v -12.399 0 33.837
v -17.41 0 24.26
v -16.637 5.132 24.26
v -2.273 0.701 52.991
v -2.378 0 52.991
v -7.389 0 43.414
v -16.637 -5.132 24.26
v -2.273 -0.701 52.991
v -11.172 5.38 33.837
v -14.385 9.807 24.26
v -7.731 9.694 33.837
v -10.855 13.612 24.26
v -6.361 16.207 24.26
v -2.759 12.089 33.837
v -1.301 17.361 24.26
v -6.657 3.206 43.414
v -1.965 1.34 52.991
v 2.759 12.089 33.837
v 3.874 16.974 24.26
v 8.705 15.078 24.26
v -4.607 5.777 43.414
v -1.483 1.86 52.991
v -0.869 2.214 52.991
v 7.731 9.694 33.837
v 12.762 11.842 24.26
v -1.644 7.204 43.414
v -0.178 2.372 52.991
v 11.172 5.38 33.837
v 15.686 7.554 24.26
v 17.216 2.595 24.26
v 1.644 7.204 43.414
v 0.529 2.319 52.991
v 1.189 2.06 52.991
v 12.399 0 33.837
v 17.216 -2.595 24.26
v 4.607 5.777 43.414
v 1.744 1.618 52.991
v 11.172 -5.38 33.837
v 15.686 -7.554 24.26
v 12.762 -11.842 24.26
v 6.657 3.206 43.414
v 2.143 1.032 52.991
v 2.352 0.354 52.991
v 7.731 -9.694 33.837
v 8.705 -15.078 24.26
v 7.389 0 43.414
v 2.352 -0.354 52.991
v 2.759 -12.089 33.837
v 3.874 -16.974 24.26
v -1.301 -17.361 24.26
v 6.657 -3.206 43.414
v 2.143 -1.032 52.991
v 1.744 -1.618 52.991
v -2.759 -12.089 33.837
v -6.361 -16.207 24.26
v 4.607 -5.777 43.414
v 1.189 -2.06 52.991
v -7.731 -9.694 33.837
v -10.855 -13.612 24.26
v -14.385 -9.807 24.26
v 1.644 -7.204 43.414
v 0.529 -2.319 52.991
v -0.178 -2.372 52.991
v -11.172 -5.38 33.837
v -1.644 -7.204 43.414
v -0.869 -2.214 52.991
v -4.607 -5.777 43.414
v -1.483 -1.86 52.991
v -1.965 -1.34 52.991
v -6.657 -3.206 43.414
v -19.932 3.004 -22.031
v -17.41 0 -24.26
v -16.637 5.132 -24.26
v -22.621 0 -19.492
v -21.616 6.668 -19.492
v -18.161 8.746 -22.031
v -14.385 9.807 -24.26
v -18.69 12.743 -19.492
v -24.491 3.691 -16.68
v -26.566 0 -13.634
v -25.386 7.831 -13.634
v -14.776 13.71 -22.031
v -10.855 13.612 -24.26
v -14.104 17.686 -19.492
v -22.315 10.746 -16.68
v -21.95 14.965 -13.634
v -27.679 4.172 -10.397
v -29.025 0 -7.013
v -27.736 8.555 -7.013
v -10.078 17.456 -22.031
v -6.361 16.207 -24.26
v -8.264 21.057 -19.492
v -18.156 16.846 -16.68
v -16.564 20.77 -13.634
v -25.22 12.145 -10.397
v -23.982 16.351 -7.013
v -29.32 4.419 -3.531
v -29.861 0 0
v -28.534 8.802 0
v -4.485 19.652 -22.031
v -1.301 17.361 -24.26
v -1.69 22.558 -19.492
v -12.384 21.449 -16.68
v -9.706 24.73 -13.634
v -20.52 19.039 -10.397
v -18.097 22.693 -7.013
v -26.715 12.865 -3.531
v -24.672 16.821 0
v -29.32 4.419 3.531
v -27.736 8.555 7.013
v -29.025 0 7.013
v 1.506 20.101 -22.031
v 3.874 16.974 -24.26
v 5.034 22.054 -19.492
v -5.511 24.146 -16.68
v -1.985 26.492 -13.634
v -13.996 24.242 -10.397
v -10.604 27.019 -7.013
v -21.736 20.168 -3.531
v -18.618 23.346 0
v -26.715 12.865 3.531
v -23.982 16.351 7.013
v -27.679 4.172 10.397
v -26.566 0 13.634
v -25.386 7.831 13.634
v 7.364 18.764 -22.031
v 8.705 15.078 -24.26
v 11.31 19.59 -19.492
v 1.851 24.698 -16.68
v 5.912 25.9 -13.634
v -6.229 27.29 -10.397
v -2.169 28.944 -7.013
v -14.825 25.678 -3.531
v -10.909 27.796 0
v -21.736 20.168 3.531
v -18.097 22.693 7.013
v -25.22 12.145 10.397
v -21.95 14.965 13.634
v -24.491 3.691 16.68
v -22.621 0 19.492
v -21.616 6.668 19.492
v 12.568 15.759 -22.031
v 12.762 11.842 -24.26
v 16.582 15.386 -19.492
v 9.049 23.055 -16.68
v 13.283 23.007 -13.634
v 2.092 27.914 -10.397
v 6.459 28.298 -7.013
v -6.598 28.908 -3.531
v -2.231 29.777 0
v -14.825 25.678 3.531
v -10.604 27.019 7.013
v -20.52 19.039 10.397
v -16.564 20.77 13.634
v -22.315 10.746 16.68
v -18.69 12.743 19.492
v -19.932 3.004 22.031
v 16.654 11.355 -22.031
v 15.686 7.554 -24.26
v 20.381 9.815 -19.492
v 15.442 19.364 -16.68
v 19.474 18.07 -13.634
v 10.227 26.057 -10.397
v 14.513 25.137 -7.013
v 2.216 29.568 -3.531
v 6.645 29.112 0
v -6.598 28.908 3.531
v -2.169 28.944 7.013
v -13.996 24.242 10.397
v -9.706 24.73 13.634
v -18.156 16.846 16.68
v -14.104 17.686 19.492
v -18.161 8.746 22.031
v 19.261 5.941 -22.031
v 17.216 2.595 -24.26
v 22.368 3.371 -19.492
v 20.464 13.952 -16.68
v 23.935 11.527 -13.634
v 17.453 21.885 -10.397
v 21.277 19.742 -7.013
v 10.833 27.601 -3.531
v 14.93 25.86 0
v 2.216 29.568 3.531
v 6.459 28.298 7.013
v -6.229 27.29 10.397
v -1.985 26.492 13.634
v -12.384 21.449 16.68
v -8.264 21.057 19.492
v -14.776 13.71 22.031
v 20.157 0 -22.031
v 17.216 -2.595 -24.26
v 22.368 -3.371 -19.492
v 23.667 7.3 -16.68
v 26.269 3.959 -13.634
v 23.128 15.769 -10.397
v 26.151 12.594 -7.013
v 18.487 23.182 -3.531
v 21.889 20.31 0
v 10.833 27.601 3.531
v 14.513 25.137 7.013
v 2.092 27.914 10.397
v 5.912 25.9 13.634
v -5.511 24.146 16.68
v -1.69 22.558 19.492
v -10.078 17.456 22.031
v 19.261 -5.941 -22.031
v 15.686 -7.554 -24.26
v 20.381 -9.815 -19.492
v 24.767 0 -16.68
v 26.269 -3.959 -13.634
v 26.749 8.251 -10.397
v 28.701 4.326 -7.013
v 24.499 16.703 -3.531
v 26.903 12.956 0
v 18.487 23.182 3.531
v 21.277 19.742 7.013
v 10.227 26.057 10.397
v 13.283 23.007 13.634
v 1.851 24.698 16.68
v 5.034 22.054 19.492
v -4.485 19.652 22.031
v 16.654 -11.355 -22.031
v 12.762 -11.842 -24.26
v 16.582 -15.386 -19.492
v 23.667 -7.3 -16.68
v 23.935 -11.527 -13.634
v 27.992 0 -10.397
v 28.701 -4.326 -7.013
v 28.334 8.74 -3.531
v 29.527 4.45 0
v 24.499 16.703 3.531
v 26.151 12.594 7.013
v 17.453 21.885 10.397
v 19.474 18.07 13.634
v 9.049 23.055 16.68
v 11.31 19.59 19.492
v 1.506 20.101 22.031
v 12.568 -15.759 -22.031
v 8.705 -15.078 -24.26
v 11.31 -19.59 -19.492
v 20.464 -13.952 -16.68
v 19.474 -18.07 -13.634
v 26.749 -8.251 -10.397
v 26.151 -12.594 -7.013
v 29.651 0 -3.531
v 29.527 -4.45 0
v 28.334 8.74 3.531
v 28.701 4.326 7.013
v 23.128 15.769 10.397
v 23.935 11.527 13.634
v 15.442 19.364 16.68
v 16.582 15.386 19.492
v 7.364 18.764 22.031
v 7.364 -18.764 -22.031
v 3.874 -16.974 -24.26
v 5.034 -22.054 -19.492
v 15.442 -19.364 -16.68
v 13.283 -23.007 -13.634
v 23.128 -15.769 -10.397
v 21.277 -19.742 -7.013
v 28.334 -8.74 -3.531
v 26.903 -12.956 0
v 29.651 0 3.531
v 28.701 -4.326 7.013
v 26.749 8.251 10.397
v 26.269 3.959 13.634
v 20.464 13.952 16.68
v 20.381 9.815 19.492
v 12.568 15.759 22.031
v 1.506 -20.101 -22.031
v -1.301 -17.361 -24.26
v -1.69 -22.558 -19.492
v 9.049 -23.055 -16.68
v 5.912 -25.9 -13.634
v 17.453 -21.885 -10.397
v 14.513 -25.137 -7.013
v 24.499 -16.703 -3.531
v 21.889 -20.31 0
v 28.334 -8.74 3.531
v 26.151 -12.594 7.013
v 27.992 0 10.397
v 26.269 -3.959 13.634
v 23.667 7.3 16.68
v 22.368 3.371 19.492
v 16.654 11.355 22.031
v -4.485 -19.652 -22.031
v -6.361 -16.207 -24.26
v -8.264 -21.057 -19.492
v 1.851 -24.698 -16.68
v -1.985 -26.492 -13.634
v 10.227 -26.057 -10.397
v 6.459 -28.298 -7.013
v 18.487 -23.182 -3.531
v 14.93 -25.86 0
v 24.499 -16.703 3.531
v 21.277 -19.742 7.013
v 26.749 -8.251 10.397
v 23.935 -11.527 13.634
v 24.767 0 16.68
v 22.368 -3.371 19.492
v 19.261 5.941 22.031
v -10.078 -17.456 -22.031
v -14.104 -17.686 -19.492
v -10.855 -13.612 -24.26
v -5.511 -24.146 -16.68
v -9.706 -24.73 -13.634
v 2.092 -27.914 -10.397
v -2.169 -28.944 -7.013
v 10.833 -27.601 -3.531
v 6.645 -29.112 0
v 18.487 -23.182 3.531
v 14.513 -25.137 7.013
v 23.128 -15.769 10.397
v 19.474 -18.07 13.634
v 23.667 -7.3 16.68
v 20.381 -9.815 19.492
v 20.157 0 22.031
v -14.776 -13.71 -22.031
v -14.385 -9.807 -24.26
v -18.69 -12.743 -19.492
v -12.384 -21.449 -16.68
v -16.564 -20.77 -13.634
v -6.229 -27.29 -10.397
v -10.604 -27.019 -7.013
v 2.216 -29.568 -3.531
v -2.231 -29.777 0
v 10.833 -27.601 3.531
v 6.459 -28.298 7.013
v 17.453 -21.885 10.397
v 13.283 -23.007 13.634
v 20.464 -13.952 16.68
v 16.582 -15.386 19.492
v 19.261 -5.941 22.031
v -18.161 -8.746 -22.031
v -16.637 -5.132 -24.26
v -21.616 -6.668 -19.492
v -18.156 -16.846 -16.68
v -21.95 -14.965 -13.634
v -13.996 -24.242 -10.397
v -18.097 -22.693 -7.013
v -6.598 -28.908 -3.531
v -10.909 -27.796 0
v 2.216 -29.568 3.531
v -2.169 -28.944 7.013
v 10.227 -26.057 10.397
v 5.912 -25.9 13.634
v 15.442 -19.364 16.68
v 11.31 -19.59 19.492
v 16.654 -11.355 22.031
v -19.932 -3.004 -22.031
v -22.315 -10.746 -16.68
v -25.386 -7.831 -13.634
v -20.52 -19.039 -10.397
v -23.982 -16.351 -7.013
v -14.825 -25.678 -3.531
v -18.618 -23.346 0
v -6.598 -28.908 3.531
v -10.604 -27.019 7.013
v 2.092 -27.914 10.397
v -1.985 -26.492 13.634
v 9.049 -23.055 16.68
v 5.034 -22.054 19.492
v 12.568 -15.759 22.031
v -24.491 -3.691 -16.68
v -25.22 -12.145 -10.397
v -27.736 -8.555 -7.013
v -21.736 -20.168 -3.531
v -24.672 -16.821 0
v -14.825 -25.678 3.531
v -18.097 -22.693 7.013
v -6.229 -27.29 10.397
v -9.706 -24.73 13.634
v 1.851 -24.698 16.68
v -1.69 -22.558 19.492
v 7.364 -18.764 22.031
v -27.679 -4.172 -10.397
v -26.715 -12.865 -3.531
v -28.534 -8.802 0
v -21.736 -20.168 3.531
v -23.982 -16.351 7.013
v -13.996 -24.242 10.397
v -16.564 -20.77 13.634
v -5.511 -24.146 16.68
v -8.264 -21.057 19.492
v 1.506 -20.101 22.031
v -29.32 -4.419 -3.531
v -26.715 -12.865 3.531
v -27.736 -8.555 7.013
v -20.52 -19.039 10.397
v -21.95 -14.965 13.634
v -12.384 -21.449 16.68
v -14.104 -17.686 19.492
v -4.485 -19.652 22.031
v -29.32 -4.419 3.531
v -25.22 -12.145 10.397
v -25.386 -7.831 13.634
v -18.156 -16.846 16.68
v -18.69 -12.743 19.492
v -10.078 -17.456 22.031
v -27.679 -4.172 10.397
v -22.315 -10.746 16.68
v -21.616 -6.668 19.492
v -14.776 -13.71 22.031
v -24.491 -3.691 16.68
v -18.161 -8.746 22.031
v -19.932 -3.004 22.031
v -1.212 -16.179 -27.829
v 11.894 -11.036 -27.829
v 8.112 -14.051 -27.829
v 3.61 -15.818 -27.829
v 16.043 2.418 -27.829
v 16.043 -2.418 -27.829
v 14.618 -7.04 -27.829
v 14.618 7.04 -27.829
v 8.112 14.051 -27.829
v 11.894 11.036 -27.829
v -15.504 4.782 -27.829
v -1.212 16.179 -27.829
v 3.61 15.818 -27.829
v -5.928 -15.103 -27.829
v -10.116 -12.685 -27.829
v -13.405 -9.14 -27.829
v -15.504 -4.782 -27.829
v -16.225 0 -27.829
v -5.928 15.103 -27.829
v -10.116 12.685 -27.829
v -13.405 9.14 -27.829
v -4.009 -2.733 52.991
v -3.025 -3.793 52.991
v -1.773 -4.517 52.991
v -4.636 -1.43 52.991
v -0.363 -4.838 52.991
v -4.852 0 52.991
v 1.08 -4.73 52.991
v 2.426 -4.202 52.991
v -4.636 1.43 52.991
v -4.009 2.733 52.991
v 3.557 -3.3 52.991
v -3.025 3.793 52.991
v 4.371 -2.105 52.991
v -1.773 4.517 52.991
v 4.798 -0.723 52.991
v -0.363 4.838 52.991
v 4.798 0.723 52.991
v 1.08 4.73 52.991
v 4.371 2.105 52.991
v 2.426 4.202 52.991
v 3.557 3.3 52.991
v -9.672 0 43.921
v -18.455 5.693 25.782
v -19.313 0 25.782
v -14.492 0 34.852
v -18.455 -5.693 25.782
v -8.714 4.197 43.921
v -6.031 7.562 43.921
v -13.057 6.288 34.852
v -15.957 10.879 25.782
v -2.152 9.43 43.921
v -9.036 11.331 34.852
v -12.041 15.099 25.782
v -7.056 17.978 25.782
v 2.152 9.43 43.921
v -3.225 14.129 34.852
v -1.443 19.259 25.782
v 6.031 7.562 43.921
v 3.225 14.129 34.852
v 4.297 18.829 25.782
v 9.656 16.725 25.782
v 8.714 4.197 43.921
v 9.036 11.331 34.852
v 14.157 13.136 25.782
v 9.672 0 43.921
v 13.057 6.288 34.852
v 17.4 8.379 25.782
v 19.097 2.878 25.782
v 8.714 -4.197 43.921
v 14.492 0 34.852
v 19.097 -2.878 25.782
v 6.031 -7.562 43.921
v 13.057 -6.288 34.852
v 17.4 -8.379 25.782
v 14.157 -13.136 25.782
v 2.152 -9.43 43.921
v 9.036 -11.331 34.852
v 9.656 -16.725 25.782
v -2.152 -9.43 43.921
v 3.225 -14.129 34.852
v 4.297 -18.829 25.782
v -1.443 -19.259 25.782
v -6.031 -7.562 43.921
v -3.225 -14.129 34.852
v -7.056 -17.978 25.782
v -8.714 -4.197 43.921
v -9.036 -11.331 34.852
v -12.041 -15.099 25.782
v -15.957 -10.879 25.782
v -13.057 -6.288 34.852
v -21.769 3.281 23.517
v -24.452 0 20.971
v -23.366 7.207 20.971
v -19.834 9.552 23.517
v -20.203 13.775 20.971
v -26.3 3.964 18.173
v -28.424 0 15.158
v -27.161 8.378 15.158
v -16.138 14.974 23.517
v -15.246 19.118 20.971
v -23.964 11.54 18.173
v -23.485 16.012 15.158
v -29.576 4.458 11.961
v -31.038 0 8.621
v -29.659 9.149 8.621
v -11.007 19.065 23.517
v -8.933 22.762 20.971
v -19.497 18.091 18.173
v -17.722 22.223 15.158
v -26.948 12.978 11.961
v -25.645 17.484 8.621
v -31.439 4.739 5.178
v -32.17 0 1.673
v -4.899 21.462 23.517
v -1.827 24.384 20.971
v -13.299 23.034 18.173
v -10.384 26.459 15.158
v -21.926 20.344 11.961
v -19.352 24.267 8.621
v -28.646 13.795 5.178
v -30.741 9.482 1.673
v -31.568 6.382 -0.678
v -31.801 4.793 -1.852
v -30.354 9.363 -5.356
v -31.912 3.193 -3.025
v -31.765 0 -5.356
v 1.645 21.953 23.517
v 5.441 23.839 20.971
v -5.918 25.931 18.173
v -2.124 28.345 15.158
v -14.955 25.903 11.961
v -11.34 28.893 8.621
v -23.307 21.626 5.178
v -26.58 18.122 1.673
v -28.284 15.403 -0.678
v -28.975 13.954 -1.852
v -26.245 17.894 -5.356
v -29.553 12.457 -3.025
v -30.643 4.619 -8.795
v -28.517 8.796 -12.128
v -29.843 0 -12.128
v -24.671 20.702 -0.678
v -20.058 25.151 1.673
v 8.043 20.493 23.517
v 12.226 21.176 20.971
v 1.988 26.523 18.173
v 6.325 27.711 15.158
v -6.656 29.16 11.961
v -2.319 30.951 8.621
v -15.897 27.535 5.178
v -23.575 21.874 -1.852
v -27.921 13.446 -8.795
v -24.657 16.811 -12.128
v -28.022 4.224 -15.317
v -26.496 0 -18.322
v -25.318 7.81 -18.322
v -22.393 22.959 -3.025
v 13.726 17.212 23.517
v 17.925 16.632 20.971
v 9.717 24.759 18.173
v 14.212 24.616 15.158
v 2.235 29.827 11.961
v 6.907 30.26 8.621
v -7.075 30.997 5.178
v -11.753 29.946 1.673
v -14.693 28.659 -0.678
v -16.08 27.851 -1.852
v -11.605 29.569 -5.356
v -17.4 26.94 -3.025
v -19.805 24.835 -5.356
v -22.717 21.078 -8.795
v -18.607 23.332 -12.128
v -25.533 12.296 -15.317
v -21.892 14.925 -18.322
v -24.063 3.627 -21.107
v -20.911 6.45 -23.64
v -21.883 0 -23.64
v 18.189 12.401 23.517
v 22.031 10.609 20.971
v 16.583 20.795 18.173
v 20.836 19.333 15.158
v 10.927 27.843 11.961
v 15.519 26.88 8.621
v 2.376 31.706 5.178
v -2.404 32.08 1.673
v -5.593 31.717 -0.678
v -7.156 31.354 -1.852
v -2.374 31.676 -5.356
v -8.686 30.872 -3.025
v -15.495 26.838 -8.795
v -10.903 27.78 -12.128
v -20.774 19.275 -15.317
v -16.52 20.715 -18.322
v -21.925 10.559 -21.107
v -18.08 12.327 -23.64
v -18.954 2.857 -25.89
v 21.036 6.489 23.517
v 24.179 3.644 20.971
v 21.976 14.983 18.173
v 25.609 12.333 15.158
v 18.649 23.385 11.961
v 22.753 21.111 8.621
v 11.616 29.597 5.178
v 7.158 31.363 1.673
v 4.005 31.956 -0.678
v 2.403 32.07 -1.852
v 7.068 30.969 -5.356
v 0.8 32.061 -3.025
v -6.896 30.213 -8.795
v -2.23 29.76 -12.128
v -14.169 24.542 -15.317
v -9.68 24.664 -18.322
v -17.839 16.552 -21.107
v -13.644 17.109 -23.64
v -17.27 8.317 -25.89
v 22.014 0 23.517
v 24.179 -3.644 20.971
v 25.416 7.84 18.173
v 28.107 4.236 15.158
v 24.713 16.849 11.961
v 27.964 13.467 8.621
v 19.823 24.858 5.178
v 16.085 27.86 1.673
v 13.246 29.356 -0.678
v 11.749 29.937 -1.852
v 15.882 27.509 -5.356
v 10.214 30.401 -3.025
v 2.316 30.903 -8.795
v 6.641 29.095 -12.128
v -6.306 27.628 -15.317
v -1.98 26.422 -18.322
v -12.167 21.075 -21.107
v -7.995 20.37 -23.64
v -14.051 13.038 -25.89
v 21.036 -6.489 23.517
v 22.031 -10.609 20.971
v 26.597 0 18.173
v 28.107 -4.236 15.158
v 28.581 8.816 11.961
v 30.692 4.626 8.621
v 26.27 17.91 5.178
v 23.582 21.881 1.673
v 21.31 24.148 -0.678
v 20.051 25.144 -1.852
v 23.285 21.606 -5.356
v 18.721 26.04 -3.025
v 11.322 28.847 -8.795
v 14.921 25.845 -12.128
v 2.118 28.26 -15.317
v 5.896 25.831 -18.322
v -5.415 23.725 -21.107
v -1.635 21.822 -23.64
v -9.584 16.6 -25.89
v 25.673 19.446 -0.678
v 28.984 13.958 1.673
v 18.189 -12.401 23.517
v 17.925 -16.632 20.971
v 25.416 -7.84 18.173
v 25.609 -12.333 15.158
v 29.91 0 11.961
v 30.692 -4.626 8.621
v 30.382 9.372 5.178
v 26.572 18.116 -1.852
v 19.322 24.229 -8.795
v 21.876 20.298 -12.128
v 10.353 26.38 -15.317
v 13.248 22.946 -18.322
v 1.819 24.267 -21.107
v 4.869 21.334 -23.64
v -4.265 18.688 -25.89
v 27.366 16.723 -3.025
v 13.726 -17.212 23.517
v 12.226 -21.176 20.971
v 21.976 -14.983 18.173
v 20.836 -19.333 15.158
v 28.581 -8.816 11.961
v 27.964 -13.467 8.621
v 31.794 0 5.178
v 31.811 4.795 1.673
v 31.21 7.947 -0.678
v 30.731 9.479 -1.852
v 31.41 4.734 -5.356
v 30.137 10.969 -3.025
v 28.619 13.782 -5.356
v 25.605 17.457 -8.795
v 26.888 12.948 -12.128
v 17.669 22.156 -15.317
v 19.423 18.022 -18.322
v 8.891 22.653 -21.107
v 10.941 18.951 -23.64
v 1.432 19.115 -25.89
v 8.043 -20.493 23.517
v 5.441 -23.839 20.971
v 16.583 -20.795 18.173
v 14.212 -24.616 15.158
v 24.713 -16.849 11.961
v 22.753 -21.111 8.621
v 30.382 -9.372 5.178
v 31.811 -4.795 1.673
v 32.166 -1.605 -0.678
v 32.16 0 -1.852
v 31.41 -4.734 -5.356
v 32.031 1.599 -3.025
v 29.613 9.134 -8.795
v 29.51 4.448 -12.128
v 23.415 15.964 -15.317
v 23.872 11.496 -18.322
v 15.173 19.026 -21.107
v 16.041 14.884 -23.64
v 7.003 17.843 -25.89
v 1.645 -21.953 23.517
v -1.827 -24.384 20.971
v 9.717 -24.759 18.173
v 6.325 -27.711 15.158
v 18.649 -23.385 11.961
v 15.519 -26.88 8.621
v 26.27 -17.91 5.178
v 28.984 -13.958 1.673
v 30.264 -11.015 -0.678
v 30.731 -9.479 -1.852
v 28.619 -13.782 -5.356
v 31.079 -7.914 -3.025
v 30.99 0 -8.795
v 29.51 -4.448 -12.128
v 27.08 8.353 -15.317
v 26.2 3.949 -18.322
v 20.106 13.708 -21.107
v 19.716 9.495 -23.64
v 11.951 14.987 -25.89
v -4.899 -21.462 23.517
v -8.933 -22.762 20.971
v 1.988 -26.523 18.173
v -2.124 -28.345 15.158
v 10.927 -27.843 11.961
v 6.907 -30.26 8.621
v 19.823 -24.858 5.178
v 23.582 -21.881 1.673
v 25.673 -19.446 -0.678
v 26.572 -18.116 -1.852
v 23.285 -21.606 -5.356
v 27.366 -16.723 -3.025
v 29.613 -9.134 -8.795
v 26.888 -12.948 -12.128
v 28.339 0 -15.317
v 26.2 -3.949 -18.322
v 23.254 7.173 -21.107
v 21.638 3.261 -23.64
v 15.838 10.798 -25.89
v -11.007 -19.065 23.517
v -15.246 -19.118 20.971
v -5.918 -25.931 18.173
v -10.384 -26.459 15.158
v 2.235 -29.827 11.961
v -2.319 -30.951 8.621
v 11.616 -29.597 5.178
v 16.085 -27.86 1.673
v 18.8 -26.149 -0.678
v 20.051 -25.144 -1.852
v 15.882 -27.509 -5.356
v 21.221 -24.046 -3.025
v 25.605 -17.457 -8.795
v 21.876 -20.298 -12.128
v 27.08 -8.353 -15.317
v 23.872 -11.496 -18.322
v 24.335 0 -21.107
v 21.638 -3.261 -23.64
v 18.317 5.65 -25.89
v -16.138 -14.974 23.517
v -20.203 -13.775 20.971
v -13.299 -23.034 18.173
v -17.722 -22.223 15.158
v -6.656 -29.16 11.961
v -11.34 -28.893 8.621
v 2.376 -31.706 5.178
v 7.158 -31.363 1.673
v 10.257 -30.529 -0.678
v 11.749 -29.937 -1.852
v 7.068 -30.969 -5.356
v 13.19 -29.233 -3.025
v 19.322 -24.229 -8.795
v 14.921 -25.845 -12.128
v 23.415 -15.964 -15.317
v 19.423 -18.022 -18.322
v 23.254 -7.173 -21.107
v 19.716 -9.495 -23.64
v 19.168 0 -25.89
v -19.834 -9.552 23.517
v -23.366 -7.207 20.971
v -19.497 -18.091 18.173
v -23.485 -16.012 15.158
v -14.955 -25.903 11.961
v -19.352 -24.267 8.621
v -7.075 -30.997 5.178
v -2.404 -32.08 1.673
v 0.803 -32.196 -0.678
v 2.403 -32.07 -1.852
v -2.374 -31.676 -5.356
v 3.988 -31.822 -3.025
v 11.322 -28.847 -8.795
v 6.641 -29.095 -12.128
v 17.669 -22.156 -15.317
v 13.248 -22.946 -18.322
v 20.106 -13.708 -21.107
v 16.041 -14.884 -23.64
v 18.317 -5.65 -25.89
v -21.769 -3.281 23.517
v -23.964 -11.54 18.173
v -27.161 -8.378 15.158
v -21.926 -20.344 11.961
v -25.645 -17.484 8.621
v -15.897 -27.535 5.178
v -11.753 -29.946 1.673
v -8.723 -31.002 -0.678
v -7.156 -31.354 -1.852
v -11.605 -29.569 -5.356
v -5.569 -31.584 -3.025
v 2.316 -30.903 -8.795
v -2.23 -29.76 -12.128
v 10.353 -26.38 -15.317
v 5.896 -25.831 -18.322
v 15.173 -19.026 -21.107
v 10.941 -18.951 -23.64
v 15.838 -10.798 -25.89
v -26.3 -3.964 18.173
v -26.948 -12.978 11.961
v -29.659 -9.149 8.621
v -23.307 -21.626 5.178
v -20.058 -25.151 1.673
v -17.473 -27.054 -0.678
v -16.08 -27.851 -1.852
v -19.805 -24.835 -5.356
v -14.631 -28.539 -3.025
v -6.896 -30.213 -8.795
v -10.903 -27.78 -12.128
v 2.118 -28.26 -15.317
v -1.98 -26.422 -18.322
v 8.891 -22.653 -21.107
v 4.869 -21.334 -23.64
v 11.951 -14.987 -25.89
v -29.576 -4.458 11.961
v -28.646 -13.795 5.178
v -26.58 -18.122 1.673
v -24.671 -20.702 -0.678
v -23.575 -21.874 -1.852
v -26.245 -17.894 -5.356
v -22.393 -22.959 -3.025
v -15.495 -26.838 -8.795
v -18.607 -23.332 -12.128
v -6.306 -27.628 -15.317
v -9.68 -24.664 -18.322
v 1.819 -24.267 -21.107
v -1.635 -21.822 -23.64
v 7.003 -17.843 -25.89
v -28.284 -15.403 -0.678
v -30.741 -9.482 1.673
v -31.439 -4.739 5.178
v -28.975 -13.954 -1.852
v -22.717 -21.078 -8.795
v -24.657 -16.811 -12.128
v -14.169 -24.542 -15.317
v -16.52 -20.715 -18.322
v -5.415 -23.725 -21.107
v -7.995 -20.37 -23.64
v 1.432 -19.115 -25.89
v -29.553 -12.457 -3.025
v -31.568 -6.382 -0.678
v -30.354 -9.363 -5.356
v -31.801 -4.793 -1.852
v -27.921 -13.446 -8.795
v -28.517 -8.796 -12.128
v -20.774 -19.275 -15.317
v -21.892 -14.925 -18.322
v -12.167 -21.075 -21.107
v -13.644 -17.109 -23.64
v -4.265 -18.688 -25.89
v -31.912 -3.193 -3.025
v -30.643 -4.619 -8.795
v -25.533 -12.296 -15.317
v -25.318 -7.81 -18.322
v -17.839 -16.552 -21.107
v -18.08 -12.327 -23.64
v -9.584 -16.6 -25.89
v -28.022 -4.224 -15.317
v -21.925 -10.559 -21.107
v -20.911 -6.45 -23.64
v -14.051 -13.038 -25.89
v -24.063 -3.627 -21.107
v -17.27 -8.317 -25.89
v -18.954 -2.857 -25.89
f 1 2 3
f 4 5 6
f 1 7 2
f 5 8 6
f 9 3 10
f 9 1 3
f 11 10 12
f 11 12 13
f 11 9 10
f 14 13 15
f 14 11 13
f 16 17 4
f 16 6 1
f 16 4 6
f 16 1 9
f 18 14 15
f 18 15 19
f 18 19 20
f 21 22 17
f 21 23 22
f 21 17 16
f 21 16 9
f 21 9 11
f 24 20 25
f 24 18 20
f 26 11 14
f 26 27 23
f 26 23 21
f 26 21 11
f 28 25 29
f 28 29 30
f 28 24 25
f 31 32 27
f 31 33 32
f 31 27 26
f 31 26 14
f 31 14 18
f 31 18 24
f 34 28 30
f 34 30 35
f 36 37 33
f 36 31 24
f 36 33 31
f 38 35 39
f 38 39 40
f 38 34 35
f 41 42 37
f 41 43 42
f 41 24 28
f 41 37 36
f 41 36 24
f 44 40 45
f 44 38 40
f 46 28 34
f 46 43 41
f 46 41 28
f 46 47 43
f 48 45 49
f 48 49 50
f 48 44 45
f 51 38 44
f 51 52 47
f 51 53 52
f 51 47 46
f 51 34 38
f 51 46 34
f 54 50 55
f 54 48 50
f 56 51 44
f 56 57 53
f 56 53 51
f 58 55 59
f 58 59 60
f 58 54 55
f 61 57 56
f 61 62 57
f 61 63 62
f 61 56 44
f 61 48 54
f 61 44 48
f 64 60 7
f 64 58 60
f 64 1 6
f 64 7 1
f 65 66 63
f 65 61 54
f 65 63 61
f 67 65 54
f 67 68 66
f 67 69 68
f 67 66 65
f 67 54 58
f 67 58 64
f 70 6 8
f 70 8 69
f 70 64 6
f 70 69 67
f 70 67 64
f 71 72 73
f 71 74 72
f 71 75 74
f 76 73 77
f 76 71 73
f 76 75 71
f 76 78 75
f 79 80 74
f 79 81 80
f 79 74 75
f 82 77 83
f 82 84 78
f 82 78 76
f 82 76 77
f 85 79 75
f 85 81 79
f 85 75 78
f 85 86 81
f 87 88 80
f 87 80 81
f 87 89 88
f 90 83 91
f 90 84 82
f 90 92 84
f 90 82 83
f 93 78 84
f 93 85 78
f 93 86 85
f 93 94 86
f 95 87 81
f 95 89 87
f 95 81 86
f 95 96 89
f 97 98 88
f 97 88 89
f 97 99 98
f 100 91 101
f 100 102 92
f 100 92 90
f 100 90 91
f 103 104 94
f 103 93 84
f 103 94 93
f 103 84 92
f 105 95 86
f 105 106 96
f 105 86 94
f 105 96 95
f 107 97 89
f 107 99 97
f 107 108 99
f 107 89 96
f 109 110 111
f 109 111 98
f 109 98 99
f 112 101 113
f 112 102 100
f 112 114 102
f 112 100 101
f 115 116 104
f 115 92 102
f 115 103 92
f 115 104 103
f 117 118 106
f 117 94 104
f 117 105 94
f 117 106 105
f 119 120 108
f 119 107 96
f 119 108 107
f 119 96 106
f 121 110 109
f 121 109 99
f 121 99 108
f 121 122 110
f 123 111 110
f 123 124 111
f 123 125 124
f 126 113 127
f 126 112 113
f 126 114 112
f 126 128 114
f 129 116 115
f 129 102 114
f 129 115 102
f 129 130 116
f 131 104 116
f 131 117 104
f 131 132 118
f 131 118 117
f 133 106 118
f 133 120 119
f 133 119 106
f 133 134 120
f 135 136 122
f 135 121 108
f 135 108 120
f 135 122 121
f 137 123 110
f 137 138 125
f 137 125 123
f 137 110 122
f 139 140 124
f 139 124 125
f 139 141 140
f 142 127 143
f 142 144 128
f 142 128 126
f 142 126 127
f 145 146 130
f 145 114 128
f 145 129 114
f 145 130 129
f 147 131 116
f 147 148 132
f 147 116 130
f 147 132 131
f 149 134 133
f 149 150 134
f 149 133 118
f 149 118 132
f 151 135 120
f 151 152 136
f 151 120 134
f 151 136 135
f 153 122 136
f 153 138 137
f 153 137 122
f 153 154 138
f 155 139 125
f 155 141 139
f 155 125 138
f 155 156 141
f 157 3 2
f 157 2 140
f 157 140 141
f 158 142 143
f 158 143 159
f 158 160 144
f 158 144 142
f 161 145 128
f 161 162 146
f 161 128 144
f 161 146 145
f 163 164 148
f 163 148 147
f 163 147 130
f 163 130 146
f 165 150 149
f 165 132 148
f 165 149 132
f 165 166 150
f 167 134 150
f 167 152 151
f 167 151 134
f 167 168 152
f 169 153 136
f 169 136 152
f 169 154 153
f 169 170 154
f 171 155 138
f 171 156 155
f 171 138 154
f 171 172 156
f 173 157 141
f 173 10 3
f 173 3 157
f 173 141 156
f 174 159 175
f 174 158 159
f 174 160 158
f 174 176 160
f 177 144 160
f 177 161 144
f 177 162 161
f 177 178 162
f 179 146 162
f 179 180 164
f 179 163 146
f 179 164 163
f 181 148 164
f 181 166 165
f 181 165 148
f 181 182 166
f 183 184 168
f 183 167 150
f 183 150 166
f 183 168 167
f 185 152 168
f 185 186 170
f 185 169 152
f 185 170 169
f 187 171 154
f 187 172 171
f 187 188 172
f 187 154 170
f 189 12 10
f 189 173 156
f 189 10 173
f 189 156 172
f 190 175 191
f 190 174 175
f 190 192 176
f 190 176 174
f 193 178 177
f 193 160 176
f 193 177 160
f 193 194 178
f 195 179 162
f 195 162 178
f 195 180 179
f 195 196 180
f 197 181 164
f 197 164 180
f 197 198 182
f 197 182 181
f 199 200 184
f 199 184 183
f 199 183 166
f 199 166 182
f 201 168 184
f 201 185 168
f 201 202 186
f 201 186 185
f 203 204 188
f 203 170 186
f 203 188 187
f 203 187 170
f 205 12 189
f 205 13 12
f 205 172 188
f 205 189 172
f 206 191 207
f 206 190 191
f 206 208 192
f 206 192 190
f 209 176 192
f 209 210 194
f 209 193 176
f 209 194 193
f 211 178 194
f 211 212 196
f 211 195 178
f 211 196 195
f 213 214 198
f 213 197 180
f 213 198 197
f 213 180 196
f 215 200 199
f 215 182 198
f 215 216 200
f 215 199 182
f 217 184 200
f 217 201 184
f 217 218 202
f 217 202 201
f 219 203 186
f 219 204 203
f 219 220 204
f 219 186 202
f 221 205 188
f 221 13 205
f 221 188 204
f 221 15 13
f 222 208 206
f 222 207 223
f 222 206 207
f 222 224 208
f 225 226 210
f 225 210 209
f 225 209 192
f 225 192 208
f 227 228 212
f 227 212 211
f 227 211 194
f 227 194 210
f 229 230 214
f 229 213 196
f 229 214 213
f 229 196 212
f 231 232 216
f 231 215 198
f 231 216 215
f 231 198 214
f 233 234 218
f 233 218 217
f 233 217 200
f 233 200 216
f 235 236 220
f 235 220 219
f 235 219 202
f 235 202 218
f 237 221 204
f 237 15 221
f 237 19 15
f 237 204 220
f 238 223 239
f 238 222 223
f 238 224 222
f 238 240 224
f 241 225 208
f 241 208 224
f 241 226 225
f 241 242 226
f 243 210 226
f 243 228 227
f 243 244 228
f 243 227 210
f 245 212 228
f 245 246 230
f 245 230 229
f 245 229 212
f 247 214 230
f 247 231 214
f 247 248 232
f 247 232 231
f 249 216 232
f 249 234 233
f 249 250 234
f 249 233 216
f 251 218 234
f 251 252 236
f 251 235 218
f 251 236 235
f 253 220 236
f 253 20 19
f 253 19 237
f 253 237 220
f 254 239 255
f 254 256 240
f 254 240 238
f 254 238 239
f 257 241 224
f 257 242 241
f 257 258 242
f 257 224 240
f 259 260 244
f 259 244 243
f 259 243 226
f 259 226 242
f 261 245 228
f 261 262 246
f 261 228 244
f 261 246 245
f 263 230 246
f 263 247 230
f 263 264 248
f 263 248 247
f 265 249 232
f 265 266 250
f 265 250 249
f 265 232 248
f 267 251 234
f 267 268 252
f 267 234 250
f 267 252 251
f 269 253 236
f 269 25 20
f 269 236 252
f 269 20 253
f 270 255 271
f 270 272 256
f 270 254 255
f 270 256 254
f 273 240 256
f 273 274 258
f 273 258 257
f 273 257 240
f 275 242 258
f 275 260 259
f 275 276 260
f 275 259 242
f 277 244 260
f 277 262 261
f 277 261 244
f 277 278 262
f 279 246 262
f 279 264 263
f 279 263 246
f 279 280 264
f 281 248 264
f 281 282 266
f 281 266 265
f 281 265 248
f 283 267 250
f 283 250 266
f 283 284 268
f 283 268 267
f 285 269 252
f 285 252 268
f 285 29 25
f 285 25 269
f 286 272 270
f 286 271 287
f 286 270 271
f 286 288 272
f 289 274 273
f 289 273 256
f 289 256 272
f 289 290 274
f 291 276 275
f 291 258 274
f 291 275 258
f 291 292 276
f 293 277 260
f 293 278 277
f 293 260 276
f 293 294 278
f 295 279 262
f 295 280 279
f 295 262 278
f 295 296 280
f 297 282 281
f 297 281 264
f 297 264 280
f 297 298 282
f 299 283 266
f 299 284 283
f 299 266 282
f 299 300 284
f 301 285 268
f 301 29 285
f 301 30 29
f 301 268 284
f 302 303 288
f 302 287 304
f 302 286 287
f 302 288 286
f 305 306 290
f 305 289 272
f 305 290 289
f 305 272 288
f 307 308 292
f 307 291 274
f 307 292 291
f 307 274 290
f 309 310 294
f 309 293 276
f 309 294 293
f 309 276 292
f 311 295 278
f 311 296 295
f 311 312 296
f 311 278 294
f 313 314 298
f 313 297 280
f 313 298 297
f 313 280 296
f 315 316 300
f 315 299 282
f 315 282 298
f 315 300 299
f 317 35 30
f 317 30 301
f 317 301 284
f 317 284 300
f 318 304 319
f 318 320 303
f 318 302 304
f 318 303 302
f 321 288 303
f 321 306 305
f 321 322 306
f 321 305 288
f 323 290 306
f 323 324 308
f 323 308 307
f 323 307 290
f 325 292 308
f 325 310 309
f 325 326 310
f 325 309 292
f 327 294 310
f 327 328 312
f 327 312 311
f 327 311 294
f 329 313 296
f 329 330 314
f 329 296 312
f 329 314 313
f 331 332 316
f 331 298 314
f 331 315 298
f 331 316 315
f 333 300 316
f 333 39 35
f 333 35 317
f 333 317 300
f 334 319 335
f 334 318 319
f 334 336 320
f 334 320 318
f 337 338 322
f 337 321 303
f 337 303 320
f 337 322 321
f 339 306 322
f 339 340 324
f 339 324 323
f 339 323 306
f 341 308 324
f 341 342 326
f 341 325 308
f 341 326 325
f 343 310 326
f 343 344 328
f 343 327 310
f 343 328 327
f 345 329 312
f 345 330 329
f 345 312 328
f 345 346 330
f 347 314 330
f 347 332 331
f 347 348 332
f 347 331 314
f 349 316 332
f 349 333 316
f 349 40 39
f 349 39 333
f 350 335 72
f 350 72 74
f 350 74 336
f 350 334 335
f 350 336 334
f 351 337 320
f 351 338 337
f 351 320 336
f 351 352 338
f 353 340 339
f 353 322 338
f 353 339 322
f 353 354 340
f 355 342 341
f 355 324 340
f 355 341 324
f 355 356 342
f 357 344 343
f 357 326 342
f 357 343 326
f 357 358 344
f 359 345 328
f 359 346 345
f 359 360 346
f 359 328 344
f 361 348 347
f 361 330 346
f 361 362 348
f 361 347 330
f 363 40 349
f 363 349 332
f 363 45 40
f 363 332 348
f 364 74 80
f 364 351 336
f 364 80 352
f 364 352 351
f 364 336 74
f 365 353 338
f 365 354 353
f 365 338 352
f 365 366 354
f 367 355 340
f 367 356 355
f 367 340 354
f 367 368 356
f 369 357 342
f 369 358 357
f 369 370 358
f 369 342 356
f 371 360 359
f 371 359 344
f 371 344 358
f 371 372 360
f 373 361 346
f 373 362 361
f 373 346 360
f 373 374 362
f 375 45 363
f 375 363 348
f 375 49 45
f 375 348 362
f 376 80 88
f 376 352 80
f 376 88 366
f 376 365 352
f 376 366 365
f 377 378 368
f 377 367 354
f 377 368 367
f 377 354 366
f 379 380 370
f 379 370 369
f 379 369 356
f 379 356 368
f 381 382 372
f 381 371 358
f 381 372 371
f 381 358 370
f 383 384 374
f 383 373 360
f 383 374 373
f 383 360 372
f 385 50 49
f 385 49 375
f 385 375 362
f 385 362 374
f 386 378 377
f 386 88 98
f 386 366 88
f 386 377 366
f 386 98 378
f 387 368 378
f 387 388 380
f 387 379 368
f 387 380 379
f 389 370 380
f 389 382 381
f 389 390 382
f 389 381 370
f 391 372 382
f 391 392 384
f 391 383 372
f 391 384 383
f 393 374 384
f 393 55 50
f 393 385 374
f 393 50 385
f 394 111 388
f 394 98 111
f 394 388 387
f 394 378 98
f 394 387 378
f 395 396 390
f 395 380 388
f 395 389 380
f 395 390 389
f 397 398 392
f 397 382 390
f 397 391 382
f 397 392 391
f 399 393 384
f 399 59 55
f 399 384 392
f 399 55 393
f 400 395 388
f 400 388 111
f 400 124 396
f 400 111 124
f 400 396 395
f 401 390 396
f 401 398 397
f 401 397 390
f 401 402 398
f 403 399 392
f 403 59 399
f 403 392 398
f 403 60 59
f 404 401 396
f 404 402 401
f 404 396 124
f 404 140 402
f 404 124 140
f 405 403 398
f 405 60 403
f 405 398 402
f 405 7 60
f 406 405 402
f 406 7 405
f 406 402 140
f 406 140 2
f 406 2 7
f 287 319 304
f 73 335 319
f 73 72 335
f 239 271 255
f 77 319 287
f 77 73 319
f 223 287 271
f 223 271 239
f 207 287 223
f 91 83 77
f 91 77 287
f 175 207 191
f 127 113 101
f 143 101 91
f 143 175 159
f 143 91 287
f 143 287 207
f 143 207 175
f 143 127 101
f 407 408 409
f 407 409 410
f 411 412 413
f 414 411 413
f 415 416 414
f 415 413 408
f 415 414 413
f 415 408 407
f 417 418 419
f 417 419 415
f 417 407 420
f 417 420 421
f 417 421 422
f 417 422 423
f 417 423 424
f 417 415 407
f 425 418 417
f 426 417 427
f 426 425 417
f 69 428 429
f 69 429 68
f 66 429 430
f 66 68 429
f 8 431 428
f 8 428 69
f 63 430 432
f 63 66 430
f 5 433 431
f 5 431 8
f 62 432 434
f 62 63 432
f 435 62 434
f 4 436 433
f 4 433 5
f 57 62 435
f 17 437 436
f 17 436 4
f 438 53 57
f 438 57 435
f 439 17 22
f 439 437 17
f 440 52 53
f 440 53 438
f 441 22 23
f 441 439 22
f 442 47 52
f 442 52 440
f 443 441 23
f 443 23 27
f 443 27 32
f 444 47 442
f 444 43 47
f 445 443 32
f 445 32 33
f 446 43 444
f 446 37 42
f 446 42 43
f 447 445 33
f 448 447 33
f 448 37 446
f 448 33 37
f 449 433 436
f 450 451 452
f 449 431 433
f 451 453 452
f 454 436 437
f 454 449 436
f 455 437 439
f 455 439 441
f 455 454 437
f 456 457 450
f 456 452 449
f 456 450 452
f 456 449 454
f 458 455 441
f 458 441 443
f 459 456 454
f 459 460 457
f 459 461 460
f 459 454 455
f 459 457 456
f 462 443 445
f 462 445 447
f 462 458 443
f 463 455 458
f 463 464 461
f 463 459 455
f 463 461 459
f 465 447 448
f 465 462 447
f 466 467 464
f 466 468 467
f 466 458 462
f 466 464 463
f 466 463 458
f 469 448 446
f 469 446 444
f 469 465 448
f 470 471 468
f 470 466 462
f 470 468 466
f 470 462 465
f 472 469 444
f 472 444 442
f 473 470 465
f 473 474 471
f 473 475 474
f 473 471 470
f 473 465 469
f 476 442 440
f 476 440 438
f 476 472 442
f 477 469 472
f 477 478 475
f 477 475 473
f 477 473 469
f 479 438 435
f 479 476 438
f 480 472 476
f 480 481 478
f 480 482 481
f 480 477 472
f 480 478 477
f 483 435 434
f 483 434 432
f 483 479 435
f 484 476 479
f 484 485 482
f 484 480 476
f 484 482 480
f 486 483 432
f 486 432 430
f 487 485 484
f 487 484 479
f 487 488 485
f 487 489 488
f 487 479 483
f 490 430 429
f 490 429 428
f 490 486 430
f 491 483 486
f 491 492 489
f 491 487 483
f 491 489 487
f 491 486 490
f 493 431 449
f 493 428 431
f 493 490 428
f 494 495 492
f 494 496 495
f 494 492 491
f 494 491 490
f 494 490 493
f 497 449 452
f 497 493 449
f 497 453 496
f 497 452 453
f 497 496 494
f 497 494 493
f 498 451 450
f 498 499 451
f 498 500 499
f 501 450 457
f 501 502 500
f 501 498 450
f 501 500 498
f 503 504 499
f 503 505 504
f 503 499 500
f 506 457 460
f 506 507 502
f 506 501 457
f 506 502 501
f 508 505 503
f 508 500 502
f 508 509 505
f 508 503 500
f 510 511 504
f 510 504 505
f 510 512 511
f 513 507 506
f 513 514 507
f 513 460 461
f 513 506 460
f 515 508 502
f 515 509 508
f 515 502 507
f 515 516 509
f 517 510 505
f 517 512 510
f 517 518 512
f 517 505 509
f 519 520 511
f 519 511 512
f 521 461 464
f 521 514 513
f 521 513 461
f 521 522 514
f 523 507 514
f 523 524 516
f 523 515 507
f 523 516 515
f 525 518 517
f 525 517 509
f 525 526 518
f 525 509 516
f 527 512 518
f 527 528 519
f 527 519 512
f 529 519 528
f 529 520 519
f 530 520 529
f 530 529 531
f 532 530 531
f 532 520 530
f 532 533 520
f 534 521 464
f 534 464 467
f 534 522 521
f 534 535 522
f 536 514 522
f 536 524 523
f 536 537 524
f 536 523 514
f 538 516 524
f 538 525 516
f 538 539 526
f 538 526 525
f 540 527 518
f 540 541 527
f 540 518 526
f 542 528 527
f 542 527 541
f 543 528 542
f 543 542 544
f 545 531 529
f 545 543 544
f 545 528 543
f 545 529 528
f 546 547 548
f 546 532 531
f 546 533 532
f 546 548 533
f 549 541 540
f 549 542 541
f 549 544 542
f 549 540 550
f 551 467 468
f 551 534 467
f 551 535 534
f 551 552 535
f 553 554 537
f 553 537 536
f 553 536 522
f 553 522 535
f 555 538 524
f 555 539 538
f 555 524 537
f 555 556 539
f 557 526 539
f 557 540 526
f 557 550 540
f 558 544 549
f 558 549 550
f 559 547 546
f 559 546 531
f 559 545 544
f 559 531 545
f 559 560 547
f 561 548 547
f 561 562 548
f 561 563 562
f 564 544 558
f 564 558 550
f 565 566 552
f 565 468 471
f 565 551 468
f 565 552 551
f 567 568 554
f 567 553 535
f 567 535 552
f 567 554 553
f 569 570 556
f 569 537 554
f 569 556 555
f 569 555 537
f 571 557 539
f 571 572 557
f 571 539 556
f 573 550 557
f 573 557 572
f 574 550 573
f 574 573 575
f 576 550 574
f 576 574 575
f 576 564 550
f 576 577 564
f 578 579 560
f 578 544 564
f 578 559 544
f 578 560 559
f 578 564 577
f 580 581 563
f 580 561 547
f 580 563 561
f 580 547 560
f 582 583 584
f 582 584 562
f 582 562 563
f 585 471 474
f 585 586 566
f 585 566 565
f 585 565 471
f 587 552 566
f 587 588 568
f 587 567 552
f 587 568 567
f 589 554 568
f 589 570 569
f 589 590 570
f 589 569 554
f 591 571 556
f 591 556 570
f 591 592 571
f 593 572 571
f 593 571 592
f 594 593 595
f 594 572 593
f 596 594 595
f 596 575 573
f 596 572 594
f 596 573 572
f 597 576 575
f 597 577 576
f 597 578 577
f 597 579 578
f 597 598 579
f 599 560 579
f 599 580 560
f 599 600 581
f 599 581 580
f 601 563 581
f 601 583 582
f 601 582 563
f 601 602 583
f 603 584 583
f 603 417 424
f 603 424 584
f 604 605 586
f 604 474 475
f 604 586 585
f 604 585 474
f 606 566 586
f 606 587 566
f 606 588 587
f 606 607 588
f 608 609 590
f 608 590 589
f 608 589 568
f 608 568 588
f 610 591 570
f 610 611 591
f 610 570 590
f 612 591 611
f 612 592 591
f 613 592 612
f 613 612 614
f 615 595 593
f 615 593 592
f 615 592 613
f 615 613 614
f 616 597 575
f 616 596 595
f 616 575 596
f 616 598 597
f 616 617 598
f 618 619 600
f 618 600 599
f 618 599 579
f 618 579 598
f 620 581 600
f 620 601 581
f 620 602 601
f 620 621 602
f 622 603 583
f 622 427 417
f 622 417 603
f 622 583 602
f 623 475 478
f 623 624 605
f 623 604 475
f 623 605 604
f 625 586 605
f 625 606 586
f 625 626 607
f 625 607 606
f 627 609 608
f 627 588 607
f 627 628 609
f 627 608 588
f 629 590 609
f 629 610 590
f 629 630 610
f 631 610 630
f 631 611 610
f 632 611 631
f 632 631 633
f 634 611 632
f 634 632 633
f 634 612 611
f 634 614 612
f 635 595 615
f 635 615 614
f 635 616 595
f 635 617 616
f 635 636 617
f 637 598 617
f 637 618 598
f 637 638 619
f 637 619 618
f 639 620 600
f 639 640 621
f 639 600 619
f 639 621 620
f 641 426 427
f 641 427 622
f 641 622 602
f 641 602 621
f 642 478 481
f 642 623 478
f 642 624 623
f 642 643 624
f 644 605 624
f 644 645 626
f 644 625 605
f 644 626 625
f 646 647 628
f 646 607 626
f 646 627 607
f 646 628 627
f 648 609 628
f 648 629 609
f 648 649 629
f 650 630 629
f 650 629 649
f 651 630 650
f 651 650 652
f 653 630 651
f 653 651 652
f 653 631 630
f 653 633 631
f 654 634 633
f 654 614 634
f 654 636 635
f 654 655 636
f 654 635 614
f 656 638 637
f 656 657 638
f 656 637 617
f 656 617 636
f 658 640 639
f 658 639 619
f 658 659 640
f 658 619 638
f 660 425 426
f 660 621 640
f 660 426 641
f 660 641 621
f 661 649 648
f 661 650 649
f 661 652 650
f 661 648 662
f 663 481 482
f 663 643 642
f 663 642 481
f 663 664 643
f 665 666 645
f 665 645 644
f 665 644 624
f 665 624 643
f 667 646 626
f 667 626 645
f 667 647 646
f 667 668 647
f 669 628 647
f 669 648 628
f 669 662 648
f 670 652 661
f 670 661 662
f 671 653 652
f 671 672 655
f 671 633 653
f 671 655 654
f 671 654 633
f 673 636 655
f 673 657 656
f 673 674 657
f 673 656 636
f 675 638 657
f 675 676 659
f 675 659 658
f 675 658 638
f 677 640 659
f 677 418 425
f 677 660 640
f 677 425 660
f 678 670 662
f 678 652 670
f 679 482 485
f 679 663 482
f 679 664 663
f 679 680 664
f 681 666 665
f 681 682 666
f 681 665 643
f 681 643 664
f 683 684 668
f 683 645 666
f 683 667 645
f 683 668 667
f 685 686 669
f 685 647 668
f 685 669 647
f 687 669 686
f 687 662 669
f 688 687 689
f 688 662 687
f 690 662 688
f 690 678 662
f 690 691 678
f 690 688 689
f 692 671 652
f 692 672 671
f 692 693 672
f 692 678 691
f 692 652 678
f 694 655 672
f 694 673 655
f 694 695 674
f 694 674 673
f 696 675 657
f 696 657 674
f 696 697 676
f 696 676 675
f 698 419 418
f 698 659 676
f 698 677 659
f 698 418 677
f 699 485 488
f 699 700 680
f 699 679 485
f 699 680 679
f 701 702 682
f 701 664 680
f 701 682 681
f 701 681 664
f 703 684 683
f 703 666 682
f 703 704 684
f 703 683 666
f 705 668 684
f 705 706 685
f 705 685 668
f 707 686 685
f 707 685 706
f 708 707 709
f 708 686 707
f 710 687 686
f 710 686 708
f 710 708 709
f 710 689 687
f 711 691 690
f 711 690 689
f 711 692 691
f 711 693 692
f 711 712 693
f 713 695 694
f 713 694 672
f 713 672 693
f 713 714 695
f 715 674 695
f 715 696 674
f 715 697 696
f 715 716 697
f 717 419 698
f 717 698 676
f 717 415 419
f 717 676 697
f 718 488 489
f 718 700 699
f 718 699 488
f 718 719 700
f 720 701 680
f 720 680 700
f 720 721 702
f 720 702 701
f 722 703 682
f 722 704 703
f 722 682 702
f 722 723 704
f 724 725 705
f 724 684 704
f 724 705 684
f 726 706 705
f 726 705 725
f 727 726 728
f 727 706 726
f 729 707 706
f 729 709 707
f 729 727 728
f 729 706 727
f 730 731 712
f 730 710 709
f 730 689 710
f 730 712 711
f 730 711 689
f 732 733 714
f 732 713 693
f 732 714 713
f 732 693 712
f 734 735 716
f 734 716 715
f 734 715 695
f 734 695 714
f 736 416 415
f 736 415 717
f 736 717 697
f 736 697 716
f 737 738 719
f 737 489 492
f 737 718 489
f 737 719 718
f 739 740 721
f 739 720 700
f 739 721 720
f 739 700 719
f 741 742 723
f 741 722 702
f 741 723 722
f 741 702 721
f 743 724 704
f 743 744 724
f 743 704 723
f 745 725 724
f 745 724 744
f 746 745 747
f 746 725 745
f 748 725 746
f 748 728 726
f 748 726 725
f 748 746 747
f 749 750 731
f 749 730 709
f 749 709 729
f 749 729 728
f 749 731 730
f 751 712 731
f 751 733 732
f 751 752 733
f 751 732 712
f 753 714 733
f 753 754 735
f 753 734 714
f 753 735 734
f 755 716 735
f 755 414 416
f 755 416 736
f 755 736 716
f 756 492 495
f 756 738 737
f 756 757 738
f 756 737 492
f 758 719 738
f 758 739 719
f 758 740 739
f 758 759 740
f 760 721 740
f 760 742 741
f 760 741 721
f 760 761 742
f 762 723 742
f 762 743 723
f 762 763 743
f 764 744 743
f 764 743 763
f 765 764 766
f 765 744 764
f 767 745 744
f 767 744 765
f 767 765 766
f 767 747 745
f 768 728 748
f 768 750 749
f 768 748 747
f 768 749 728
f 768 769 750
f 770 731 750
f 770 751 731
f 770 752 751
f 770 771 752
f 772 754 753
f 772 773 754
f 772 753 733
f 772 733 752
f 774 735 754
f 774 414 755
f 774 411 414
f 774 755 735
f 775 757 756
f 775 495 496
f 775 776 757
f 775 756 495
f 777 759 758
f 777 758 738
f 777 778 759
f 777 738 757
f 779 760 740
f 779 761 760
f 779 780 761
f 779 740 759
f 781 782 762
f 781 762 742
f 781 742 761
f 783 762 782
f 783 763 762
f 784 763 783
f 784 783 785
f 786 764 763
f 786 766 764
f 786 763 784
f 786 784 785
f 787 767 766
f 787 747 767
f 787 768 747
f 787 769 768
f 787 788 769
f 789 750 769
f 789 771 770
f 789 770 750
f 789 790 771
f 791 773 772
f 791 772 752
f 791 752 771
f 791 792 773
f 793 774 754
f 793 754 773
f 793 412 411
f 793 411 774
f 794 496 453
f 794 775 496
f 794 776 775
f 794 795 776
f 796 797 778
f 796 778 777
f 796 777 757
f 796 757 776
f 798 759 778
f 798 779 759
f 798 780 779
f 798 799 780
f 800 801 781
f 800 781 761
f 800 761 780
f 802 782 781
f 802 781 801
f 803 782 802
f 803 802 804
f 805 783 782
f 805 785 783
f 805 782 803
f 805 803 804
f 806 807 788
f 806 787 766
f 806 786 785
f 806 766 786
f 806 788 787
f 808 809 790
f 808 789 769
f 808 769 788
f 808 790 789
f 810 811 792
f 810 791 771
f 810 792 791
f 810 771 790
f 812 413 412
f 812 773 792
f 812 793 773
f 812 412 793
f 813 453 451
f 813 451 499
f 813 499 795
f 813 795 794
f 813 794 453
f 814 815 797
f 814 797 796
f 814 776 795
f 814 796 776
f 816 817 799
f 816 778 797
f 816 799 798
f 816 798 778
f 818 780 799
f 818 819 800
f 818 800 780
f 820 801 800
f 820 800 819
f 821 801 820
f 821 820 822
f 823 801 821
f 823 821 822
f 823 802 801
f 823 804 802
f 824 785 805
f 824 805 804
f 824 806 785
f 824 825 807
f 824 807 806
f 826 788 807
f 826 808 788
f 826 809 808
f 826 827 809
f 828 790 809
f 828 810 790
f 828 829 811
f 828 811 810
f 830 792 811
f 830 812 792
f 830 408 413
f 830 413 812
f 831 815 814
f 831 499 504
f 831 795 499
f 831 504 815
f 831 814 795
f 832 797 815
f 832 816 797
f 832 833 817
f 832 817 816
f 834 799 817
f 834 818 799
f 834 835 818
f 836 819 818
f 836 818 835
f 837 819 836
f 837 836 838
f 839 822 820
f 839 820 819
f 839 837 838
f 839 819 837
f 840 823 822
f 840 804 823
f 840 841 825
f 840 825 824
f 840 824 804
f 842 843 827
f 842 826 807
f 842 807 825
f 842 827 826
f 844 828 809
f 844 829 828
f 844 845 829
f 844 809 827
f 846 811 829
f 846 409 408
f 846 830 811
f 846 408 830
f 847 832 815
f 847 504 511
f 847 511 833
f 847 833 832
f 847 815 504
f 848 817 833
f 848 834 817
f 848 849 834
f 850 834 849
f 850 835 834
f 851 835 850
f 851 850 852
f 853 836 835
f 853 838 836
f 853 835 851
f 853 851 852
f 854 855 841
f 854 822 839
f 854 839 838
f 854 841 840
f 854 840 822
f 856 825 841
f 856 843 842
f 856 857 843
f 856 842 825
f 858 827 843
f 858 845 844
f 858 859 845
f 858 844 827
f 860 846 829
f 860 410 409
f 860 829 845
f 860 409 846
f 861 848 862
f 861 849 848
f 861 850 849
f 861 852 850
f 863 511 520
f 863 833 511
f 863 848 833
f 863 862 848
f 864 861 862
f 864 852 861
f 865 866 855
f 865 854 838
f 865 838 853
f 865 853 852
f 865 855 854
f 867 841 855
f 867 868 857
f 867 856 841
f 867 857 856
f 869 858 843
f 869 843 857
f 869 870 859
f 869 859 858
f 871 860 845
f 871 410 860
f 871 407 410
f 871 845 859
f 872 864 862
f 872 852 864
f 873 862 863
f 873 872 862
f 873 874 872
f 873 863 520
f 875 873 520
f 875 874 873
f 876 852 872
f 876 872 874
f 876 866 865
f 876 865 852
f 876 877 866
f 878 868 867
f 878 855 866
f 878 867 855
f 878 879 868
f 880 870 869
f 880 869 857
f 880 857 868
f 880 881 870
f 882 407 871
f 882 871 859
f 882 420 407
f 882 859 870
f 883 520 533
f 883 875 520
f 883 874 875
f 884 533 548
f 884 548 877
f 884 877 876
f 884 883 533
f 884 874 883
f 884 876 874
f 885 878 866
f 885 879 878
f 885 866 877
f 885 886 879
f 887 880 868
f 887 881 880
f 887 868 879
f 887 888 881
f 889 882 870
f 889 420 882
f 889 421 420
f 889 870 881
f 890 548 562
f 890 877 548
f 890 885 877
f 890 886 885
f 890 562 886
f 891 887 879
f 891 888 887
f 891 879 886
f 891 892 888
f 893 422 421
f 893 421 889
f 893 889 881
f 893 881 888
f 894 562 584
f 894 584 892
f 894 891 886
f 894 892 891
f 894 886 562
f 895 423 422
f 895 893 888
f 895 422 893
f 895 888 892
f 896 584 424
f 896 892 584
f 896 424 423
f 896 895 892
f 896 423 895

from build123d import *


with BuildPart() as f1:
    # F0 (on Front) → F1 (revolve)
    with BuildSketch(Plane.XZ):
        with BuildLine():
            Line((-4.851975, 52.991167), (-19.31276, 25.782058))
            ThreePointArc((-19.31276, 25.782058), (-32.16, -1.852469), (-16.224671, -27.829072))
            Line((-16.224671, -27.829072), (0, -27.829072))
            Line((0, -27.829072), (0, -24.259869))
            Line((0, -24.259869), (-17.410023, -24.259869))
            ThreePointArc((-17.410023, -24.259869), (-29.860512, 0), (-17.410023, 24.259869))
            Line((-17.410023, 24.259869), (-2.378419, 52.991167))
            Line((-2.378419, 52.991167), (-4.851975, 52.991167))
        make_face()
    revolve(axis=Axis((0, 0, 11.130998), (0, 0, -1)))


solid = f1.part
